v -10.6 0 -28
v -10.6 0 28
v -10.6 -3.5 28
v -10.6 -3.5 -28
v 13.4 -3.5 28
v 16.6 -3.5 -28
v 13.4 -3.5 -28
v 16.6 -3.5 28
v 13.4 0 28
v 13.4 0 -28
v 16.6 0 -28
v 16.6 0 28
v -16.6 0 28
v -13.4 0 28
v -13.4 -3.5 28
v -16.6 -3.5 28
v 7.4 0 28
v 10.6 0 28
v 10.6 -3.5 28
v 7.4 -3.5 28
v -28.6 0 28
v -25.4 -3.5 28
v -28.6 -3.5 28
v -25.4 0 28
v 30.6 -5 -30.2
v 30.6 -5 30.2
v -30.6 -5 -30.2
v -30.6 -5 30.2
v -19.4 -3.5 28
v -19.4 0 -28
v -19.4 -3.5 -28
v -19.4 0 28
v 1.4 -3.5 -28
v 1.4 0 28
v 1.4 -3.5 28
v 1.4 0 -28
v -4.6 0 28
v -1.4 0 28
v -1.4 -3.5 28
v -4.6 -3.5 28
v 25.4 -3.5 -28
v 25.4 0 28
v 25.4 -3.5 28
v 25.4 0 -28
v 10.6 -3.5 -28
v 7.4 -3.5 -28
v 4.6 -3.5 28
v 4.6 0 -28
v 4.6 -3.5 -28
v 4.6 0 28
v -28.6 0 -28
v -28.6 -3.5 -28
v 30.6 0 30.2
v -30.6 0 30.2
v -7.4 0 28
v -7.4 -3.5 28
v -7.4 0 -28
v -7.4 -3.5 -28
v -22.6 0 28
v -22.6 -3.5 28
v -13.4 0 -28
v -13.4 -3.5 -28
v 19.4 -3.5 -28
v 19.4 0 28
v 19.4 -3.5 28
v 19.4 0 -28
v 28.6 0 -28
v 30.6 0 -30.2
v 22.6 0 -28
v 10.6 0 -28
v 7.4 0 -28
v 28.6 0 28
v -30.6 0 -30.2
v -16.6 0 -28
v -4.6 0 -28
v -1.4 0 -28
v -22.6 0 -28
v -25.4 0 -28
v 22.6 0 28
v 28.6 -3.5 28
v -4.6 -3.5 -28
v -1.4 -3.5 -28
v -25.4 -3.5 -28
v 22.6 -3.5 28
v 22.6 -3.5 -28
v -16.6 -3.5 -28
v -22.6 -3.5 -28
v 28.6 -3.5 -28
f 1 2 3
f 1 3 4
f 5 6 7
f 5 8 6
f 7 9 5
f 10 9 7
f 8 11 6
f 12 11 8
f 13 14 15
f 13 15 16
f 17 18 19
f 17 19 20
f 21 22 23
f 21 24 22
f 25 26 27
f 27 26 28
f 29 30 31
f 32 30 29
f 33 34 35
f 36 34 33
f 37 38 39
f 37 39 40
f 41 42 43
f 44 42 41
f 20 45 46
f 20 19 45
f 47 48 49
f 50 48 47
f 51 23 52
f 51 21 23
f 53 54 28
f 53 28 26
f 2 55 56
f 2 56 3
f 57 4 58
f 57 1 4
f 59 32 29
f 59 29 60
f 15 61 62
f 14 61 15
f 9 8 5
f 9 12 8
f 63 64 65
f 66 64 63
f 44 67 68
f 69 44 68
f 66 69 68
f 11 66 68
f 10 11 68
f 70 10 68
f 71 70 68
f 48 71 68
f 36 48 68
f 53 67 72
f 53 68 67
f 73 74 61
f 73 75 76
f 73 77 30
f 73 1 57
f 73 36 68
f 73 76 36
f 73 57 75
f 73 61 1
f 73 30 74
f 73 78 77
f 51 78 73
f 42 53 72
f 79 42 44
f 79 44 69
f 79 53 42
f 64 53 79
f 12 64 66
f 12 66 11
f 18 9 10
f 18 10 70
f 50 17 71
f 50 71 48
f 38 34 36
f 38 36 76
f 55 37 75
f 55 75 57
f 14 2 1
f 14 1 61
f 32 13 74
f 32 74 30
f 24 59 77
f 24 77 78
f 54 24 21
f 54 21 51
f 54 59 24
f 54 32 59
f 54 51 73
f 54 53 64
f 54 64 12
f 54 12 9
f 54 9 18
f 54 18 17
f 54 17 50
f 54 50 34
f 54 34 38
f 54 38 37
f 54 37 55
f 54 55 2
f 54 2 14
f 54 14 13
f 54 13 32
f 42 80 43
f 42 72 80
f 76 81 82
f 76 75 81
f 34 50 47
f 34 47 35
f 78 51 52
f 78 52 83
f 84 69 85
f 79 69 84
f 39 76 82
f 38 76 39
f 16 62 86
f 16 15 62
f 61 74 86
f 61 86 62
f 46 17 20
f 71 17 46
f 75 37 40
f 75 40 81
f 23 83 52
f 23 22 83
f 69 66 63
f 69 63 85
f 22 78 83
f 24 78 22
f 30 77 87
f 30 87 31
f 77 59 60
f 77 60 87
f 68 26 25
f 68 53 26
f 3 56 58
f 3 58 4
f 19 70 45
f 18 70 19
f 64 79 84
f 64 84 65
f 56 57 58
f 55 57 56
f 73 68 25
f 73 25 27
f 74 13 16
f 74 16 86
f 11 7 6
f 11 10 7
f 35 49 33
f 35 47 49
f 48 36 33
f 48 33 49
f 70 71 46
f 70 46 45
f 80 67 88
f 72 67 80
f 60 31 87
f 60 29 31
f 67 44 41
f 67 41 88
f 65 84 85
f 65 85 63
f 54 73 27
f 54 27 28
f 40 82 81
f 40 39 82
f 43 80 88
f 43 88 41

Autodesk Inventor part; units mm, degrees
ref_plane "YZ Plane" through (0, 0, 0) normal (1, 0, 0) x (0, 1, 0)
ref_plane "XZ Plane" through (0, 0, 0) normal (0, 1, 0) x (-1, 0, 0)
ref_plane "XY Plane" through (0, 0, 0) normal (0, 0, 1) x (1, 0, 0)
sketch "Sketch1" plane through (0, 0, 0) normal (0, 1, 0) x (-1, 0, 0)
  line L0 (28.6, -28) -> (25.4, -28)
  line L1 (25.4, -28) -> (25.4, 28)
  line L2 (25.4, 28) -> (28.6, 28)
  line L3 (28.6, 28) -> (28.6, -28)
  line L4 (28.6, -28) -> (25.4, 28) construction
  line L5 (25.4, -28) -> (28.6, 28) construction
  line L6 (22.6, -28) -> (19.4, -28)
  line L7 (19.4, -28) -> (19.4, 28)
  line L8 (19.4, 28) -> (22.6, 28)
  line L9 (22.6, 28) -> (22.6, -28)
  line L10 (22.6, -28) -> (19.4, 28) construction
  line L11 (19.4, -28) -> (22.6, 28) construction
  line L12 (16.6, -28) -> (13.4, -28)
  line L13 (13.4, -28) -> (13.4, 28)
  line L14 (13.4, 28) -> (16.6, 28)
  line L15 (16.6, 28) -> (16.6, -28)
  line L16 (16.6, -28) -> (13.4, 28) construction
  line L17 (13.4, -28) -> (16.6, 28) construction
  line L18 (10.6, -28) -> (7.4, -28)
  line L19 (7.4, 28) -> (10.6, 28)
  line L20 (7.4, -28) -> (7.4, 28)
  line L21 (10.6, -28) -> (7.4, 28) construction
  line L22 (7.4, -28) -> (10.6, 28) construction
  line L23 (10.6, 28) -> (10.6, -28)
  line L24 (4.6, -28) -> (1.4, -28)
  line L25 (1.4, 28) -> (4.6, 28)
  line L26 (1.4, -28) -> (1.4, 28)
  line L27 (4.6, -28) -> (1.4, 28) construction
  line L28 (1.4, -28) -> (4.6, 28) construction
  line L29 (4.6, 28) -> (4.6, -28)
  line L30 (-1.4, -28) -> (-4.6, -28)
  line L31 (-4.6, 28) -> (-1.4, 28)
  line L32 (-4.6, -28) -> (-4.6, 28)
  line L33 (-1.4, -28) -> (-4.6, 28) construction
  line L34 (-4.6, -28) -> (-1.4, 28) construction
  line L35 (-1.4, 28) -> (-1.4, -28)
  line L36 (-7.4, 28) -> (-7.4, -28)
  line L37 (-10.6, -28) -> (-7.4, 28) construction
  line L38 (-10.6, -28) -> (-10.6, 28)
  line L39 (-7.4, -28) -> (-10.6, 28) construction
  line L40 (-10.6, 28) -> (-7.4, 28)
  line L41 (-7.4, -28) -> (-10.6, -28)
  line L42 (-13.4, 28) -> (-13.4, -28)
  line L43 (-16.6, -28) -> (-13.4, 28) construction
  line L44 (-16.6, -28) -> (-16.6, 28)
  line L45 (-13.4, -28) -> (-16.6, 28) construction
  line L46 (-16.6, 28) -> (-13.4, 28)
  line L47 (-13.4, -28) -> (-16.6, -28)
  line L48 (-19.4, 28) -> (-19.4, -28)
  line L49 (-22.6, -28) -> (-19.4, 28) construction
  line L50 (-22.6, -28) -> (-22.6, 28)
  line L51 (-19.4, -28) -> (-22.6, 28) construction
  line L52 (-22.6, 28) -> (-19.4, 28)
  line L53 (-19.4, -28) -> (-22.6, -28)
  line L54 (-25.4, 28) -> (-25.4, -28)
  line L55 (-28.6, -28) -> (-25.4, 28) construction
  line L56 (-28.6, -28) -> (-28.6, 28)
  line L57 (-25.4, -28) -> (-28.6, 28) construction
  line L58 (-28.6, 28) -> (-25.4, 28)
  line L59 (-25.4, -28) -> (-28.6, -28)
  line L60 (0, 0) -> (33.435, 0)
  point P0 (27, 28)
  point P1 (21, 28)
  point P2 (15, 28)
  point P3 (9, 28)
  point P4 (3, 28)
  point P5 (-3, 28)
  point P6 (-9, 28)
  point P7 (-15, 28)
  point P8 (-21, 28)
  point P9 (-27, 28)
  point P10 (27, -28)
  point P11 (21, 0)
  point P12 (27, 0)
  point P13 (15, 0)
  point P14 (21, 0)
  point P15 (9, 0)
  point P16 (15, 0)
  point P17 (3, 0)
  point P18 (9, 0)
  point P19 (-3, 0)
  point P20 (3, 0)
  point P21 (-9, 0)
  point P22 (-3, 0)
  point P23 (-15, 0)
  point P24 (-9, 0)
  point P25 (-21, 0)
  point P26 (-15, 0)
  point P27 (-27, 0)
  point P28 (-21, 0)
  point P29 (27, 0)
  dimension "d0" = 3.2
  dimension "d1" = 3.2
  dimension "d2" = 3.2
  dimension "d3" = 3.2
  dimension "d4" = 3.2
  dimension "d5" = 3.2
  dimension "d6" = 3.2
  dimension "d7" = 3.2
  dimension "d8" = 3.2
  dimension "d9" = 6
  dimension "d10" = 6
  dimension "d11" = 6
  dimension "d12" = 6
  dimension "d13" = 6
  dimension "d14" = 6
  dimension "d15" = 6
  dimension "d16" = 6
  dimension "d17" = 6
  dimension "d19" = 3
  dimension "d26" = 56
sketch "Sketch2" plane through (0, 0, 0) normal (0, 1, 0) x (-1, 0, 0)
  line L0 (-30.6, -30.2) -> (30.6, -30.2)
  line L1 (30.6, -30.2) -> (30.6, 30.2)
  line L2 (30.6, 30.2) -> (-30.6, 30.2)
  line L3 (-30.6, 30.2) -> (-30.6, -30.2)
  line L4 (-30.6, -30.2) -> (30.6, 30.2) construction
  line L5 (30.6, -30.2) -> (-30.6, 30.2) construction
  point P0 (0, 0)
  dimension "d20" = 60.4
  dimension "d21" = 61.2
extrude "Extrusion1" add sketch "Sketch2" against normal blind 5
extrude "Extrusion2" cut sketch "Sketch1" against normal blind 3.5
equation "\"d1\" = d0"
equation "\"d2\" = d0"
equation "\"d3\" = d0"
equation "\"d4\" = d0"
equation "\"d5\" = d4"
equation "\"d6\" = d5"
equation "\"d7\" = d6"
equation "\"d8\" = d6"
equation "\"d10\" = d9"
equation "\"d11\" = d10"
equation "\"d12\" = d11"
equation "\"d13\" = d12"
equation "\"d14\" = d13"
equation "\"d15\" = d14"
equation "\"d16\" = d15"
equation "\"d17\" = d16"
equation "\"d19\" = 0.5 * d13"
properties part number "DisplayModuleHousingCap"
